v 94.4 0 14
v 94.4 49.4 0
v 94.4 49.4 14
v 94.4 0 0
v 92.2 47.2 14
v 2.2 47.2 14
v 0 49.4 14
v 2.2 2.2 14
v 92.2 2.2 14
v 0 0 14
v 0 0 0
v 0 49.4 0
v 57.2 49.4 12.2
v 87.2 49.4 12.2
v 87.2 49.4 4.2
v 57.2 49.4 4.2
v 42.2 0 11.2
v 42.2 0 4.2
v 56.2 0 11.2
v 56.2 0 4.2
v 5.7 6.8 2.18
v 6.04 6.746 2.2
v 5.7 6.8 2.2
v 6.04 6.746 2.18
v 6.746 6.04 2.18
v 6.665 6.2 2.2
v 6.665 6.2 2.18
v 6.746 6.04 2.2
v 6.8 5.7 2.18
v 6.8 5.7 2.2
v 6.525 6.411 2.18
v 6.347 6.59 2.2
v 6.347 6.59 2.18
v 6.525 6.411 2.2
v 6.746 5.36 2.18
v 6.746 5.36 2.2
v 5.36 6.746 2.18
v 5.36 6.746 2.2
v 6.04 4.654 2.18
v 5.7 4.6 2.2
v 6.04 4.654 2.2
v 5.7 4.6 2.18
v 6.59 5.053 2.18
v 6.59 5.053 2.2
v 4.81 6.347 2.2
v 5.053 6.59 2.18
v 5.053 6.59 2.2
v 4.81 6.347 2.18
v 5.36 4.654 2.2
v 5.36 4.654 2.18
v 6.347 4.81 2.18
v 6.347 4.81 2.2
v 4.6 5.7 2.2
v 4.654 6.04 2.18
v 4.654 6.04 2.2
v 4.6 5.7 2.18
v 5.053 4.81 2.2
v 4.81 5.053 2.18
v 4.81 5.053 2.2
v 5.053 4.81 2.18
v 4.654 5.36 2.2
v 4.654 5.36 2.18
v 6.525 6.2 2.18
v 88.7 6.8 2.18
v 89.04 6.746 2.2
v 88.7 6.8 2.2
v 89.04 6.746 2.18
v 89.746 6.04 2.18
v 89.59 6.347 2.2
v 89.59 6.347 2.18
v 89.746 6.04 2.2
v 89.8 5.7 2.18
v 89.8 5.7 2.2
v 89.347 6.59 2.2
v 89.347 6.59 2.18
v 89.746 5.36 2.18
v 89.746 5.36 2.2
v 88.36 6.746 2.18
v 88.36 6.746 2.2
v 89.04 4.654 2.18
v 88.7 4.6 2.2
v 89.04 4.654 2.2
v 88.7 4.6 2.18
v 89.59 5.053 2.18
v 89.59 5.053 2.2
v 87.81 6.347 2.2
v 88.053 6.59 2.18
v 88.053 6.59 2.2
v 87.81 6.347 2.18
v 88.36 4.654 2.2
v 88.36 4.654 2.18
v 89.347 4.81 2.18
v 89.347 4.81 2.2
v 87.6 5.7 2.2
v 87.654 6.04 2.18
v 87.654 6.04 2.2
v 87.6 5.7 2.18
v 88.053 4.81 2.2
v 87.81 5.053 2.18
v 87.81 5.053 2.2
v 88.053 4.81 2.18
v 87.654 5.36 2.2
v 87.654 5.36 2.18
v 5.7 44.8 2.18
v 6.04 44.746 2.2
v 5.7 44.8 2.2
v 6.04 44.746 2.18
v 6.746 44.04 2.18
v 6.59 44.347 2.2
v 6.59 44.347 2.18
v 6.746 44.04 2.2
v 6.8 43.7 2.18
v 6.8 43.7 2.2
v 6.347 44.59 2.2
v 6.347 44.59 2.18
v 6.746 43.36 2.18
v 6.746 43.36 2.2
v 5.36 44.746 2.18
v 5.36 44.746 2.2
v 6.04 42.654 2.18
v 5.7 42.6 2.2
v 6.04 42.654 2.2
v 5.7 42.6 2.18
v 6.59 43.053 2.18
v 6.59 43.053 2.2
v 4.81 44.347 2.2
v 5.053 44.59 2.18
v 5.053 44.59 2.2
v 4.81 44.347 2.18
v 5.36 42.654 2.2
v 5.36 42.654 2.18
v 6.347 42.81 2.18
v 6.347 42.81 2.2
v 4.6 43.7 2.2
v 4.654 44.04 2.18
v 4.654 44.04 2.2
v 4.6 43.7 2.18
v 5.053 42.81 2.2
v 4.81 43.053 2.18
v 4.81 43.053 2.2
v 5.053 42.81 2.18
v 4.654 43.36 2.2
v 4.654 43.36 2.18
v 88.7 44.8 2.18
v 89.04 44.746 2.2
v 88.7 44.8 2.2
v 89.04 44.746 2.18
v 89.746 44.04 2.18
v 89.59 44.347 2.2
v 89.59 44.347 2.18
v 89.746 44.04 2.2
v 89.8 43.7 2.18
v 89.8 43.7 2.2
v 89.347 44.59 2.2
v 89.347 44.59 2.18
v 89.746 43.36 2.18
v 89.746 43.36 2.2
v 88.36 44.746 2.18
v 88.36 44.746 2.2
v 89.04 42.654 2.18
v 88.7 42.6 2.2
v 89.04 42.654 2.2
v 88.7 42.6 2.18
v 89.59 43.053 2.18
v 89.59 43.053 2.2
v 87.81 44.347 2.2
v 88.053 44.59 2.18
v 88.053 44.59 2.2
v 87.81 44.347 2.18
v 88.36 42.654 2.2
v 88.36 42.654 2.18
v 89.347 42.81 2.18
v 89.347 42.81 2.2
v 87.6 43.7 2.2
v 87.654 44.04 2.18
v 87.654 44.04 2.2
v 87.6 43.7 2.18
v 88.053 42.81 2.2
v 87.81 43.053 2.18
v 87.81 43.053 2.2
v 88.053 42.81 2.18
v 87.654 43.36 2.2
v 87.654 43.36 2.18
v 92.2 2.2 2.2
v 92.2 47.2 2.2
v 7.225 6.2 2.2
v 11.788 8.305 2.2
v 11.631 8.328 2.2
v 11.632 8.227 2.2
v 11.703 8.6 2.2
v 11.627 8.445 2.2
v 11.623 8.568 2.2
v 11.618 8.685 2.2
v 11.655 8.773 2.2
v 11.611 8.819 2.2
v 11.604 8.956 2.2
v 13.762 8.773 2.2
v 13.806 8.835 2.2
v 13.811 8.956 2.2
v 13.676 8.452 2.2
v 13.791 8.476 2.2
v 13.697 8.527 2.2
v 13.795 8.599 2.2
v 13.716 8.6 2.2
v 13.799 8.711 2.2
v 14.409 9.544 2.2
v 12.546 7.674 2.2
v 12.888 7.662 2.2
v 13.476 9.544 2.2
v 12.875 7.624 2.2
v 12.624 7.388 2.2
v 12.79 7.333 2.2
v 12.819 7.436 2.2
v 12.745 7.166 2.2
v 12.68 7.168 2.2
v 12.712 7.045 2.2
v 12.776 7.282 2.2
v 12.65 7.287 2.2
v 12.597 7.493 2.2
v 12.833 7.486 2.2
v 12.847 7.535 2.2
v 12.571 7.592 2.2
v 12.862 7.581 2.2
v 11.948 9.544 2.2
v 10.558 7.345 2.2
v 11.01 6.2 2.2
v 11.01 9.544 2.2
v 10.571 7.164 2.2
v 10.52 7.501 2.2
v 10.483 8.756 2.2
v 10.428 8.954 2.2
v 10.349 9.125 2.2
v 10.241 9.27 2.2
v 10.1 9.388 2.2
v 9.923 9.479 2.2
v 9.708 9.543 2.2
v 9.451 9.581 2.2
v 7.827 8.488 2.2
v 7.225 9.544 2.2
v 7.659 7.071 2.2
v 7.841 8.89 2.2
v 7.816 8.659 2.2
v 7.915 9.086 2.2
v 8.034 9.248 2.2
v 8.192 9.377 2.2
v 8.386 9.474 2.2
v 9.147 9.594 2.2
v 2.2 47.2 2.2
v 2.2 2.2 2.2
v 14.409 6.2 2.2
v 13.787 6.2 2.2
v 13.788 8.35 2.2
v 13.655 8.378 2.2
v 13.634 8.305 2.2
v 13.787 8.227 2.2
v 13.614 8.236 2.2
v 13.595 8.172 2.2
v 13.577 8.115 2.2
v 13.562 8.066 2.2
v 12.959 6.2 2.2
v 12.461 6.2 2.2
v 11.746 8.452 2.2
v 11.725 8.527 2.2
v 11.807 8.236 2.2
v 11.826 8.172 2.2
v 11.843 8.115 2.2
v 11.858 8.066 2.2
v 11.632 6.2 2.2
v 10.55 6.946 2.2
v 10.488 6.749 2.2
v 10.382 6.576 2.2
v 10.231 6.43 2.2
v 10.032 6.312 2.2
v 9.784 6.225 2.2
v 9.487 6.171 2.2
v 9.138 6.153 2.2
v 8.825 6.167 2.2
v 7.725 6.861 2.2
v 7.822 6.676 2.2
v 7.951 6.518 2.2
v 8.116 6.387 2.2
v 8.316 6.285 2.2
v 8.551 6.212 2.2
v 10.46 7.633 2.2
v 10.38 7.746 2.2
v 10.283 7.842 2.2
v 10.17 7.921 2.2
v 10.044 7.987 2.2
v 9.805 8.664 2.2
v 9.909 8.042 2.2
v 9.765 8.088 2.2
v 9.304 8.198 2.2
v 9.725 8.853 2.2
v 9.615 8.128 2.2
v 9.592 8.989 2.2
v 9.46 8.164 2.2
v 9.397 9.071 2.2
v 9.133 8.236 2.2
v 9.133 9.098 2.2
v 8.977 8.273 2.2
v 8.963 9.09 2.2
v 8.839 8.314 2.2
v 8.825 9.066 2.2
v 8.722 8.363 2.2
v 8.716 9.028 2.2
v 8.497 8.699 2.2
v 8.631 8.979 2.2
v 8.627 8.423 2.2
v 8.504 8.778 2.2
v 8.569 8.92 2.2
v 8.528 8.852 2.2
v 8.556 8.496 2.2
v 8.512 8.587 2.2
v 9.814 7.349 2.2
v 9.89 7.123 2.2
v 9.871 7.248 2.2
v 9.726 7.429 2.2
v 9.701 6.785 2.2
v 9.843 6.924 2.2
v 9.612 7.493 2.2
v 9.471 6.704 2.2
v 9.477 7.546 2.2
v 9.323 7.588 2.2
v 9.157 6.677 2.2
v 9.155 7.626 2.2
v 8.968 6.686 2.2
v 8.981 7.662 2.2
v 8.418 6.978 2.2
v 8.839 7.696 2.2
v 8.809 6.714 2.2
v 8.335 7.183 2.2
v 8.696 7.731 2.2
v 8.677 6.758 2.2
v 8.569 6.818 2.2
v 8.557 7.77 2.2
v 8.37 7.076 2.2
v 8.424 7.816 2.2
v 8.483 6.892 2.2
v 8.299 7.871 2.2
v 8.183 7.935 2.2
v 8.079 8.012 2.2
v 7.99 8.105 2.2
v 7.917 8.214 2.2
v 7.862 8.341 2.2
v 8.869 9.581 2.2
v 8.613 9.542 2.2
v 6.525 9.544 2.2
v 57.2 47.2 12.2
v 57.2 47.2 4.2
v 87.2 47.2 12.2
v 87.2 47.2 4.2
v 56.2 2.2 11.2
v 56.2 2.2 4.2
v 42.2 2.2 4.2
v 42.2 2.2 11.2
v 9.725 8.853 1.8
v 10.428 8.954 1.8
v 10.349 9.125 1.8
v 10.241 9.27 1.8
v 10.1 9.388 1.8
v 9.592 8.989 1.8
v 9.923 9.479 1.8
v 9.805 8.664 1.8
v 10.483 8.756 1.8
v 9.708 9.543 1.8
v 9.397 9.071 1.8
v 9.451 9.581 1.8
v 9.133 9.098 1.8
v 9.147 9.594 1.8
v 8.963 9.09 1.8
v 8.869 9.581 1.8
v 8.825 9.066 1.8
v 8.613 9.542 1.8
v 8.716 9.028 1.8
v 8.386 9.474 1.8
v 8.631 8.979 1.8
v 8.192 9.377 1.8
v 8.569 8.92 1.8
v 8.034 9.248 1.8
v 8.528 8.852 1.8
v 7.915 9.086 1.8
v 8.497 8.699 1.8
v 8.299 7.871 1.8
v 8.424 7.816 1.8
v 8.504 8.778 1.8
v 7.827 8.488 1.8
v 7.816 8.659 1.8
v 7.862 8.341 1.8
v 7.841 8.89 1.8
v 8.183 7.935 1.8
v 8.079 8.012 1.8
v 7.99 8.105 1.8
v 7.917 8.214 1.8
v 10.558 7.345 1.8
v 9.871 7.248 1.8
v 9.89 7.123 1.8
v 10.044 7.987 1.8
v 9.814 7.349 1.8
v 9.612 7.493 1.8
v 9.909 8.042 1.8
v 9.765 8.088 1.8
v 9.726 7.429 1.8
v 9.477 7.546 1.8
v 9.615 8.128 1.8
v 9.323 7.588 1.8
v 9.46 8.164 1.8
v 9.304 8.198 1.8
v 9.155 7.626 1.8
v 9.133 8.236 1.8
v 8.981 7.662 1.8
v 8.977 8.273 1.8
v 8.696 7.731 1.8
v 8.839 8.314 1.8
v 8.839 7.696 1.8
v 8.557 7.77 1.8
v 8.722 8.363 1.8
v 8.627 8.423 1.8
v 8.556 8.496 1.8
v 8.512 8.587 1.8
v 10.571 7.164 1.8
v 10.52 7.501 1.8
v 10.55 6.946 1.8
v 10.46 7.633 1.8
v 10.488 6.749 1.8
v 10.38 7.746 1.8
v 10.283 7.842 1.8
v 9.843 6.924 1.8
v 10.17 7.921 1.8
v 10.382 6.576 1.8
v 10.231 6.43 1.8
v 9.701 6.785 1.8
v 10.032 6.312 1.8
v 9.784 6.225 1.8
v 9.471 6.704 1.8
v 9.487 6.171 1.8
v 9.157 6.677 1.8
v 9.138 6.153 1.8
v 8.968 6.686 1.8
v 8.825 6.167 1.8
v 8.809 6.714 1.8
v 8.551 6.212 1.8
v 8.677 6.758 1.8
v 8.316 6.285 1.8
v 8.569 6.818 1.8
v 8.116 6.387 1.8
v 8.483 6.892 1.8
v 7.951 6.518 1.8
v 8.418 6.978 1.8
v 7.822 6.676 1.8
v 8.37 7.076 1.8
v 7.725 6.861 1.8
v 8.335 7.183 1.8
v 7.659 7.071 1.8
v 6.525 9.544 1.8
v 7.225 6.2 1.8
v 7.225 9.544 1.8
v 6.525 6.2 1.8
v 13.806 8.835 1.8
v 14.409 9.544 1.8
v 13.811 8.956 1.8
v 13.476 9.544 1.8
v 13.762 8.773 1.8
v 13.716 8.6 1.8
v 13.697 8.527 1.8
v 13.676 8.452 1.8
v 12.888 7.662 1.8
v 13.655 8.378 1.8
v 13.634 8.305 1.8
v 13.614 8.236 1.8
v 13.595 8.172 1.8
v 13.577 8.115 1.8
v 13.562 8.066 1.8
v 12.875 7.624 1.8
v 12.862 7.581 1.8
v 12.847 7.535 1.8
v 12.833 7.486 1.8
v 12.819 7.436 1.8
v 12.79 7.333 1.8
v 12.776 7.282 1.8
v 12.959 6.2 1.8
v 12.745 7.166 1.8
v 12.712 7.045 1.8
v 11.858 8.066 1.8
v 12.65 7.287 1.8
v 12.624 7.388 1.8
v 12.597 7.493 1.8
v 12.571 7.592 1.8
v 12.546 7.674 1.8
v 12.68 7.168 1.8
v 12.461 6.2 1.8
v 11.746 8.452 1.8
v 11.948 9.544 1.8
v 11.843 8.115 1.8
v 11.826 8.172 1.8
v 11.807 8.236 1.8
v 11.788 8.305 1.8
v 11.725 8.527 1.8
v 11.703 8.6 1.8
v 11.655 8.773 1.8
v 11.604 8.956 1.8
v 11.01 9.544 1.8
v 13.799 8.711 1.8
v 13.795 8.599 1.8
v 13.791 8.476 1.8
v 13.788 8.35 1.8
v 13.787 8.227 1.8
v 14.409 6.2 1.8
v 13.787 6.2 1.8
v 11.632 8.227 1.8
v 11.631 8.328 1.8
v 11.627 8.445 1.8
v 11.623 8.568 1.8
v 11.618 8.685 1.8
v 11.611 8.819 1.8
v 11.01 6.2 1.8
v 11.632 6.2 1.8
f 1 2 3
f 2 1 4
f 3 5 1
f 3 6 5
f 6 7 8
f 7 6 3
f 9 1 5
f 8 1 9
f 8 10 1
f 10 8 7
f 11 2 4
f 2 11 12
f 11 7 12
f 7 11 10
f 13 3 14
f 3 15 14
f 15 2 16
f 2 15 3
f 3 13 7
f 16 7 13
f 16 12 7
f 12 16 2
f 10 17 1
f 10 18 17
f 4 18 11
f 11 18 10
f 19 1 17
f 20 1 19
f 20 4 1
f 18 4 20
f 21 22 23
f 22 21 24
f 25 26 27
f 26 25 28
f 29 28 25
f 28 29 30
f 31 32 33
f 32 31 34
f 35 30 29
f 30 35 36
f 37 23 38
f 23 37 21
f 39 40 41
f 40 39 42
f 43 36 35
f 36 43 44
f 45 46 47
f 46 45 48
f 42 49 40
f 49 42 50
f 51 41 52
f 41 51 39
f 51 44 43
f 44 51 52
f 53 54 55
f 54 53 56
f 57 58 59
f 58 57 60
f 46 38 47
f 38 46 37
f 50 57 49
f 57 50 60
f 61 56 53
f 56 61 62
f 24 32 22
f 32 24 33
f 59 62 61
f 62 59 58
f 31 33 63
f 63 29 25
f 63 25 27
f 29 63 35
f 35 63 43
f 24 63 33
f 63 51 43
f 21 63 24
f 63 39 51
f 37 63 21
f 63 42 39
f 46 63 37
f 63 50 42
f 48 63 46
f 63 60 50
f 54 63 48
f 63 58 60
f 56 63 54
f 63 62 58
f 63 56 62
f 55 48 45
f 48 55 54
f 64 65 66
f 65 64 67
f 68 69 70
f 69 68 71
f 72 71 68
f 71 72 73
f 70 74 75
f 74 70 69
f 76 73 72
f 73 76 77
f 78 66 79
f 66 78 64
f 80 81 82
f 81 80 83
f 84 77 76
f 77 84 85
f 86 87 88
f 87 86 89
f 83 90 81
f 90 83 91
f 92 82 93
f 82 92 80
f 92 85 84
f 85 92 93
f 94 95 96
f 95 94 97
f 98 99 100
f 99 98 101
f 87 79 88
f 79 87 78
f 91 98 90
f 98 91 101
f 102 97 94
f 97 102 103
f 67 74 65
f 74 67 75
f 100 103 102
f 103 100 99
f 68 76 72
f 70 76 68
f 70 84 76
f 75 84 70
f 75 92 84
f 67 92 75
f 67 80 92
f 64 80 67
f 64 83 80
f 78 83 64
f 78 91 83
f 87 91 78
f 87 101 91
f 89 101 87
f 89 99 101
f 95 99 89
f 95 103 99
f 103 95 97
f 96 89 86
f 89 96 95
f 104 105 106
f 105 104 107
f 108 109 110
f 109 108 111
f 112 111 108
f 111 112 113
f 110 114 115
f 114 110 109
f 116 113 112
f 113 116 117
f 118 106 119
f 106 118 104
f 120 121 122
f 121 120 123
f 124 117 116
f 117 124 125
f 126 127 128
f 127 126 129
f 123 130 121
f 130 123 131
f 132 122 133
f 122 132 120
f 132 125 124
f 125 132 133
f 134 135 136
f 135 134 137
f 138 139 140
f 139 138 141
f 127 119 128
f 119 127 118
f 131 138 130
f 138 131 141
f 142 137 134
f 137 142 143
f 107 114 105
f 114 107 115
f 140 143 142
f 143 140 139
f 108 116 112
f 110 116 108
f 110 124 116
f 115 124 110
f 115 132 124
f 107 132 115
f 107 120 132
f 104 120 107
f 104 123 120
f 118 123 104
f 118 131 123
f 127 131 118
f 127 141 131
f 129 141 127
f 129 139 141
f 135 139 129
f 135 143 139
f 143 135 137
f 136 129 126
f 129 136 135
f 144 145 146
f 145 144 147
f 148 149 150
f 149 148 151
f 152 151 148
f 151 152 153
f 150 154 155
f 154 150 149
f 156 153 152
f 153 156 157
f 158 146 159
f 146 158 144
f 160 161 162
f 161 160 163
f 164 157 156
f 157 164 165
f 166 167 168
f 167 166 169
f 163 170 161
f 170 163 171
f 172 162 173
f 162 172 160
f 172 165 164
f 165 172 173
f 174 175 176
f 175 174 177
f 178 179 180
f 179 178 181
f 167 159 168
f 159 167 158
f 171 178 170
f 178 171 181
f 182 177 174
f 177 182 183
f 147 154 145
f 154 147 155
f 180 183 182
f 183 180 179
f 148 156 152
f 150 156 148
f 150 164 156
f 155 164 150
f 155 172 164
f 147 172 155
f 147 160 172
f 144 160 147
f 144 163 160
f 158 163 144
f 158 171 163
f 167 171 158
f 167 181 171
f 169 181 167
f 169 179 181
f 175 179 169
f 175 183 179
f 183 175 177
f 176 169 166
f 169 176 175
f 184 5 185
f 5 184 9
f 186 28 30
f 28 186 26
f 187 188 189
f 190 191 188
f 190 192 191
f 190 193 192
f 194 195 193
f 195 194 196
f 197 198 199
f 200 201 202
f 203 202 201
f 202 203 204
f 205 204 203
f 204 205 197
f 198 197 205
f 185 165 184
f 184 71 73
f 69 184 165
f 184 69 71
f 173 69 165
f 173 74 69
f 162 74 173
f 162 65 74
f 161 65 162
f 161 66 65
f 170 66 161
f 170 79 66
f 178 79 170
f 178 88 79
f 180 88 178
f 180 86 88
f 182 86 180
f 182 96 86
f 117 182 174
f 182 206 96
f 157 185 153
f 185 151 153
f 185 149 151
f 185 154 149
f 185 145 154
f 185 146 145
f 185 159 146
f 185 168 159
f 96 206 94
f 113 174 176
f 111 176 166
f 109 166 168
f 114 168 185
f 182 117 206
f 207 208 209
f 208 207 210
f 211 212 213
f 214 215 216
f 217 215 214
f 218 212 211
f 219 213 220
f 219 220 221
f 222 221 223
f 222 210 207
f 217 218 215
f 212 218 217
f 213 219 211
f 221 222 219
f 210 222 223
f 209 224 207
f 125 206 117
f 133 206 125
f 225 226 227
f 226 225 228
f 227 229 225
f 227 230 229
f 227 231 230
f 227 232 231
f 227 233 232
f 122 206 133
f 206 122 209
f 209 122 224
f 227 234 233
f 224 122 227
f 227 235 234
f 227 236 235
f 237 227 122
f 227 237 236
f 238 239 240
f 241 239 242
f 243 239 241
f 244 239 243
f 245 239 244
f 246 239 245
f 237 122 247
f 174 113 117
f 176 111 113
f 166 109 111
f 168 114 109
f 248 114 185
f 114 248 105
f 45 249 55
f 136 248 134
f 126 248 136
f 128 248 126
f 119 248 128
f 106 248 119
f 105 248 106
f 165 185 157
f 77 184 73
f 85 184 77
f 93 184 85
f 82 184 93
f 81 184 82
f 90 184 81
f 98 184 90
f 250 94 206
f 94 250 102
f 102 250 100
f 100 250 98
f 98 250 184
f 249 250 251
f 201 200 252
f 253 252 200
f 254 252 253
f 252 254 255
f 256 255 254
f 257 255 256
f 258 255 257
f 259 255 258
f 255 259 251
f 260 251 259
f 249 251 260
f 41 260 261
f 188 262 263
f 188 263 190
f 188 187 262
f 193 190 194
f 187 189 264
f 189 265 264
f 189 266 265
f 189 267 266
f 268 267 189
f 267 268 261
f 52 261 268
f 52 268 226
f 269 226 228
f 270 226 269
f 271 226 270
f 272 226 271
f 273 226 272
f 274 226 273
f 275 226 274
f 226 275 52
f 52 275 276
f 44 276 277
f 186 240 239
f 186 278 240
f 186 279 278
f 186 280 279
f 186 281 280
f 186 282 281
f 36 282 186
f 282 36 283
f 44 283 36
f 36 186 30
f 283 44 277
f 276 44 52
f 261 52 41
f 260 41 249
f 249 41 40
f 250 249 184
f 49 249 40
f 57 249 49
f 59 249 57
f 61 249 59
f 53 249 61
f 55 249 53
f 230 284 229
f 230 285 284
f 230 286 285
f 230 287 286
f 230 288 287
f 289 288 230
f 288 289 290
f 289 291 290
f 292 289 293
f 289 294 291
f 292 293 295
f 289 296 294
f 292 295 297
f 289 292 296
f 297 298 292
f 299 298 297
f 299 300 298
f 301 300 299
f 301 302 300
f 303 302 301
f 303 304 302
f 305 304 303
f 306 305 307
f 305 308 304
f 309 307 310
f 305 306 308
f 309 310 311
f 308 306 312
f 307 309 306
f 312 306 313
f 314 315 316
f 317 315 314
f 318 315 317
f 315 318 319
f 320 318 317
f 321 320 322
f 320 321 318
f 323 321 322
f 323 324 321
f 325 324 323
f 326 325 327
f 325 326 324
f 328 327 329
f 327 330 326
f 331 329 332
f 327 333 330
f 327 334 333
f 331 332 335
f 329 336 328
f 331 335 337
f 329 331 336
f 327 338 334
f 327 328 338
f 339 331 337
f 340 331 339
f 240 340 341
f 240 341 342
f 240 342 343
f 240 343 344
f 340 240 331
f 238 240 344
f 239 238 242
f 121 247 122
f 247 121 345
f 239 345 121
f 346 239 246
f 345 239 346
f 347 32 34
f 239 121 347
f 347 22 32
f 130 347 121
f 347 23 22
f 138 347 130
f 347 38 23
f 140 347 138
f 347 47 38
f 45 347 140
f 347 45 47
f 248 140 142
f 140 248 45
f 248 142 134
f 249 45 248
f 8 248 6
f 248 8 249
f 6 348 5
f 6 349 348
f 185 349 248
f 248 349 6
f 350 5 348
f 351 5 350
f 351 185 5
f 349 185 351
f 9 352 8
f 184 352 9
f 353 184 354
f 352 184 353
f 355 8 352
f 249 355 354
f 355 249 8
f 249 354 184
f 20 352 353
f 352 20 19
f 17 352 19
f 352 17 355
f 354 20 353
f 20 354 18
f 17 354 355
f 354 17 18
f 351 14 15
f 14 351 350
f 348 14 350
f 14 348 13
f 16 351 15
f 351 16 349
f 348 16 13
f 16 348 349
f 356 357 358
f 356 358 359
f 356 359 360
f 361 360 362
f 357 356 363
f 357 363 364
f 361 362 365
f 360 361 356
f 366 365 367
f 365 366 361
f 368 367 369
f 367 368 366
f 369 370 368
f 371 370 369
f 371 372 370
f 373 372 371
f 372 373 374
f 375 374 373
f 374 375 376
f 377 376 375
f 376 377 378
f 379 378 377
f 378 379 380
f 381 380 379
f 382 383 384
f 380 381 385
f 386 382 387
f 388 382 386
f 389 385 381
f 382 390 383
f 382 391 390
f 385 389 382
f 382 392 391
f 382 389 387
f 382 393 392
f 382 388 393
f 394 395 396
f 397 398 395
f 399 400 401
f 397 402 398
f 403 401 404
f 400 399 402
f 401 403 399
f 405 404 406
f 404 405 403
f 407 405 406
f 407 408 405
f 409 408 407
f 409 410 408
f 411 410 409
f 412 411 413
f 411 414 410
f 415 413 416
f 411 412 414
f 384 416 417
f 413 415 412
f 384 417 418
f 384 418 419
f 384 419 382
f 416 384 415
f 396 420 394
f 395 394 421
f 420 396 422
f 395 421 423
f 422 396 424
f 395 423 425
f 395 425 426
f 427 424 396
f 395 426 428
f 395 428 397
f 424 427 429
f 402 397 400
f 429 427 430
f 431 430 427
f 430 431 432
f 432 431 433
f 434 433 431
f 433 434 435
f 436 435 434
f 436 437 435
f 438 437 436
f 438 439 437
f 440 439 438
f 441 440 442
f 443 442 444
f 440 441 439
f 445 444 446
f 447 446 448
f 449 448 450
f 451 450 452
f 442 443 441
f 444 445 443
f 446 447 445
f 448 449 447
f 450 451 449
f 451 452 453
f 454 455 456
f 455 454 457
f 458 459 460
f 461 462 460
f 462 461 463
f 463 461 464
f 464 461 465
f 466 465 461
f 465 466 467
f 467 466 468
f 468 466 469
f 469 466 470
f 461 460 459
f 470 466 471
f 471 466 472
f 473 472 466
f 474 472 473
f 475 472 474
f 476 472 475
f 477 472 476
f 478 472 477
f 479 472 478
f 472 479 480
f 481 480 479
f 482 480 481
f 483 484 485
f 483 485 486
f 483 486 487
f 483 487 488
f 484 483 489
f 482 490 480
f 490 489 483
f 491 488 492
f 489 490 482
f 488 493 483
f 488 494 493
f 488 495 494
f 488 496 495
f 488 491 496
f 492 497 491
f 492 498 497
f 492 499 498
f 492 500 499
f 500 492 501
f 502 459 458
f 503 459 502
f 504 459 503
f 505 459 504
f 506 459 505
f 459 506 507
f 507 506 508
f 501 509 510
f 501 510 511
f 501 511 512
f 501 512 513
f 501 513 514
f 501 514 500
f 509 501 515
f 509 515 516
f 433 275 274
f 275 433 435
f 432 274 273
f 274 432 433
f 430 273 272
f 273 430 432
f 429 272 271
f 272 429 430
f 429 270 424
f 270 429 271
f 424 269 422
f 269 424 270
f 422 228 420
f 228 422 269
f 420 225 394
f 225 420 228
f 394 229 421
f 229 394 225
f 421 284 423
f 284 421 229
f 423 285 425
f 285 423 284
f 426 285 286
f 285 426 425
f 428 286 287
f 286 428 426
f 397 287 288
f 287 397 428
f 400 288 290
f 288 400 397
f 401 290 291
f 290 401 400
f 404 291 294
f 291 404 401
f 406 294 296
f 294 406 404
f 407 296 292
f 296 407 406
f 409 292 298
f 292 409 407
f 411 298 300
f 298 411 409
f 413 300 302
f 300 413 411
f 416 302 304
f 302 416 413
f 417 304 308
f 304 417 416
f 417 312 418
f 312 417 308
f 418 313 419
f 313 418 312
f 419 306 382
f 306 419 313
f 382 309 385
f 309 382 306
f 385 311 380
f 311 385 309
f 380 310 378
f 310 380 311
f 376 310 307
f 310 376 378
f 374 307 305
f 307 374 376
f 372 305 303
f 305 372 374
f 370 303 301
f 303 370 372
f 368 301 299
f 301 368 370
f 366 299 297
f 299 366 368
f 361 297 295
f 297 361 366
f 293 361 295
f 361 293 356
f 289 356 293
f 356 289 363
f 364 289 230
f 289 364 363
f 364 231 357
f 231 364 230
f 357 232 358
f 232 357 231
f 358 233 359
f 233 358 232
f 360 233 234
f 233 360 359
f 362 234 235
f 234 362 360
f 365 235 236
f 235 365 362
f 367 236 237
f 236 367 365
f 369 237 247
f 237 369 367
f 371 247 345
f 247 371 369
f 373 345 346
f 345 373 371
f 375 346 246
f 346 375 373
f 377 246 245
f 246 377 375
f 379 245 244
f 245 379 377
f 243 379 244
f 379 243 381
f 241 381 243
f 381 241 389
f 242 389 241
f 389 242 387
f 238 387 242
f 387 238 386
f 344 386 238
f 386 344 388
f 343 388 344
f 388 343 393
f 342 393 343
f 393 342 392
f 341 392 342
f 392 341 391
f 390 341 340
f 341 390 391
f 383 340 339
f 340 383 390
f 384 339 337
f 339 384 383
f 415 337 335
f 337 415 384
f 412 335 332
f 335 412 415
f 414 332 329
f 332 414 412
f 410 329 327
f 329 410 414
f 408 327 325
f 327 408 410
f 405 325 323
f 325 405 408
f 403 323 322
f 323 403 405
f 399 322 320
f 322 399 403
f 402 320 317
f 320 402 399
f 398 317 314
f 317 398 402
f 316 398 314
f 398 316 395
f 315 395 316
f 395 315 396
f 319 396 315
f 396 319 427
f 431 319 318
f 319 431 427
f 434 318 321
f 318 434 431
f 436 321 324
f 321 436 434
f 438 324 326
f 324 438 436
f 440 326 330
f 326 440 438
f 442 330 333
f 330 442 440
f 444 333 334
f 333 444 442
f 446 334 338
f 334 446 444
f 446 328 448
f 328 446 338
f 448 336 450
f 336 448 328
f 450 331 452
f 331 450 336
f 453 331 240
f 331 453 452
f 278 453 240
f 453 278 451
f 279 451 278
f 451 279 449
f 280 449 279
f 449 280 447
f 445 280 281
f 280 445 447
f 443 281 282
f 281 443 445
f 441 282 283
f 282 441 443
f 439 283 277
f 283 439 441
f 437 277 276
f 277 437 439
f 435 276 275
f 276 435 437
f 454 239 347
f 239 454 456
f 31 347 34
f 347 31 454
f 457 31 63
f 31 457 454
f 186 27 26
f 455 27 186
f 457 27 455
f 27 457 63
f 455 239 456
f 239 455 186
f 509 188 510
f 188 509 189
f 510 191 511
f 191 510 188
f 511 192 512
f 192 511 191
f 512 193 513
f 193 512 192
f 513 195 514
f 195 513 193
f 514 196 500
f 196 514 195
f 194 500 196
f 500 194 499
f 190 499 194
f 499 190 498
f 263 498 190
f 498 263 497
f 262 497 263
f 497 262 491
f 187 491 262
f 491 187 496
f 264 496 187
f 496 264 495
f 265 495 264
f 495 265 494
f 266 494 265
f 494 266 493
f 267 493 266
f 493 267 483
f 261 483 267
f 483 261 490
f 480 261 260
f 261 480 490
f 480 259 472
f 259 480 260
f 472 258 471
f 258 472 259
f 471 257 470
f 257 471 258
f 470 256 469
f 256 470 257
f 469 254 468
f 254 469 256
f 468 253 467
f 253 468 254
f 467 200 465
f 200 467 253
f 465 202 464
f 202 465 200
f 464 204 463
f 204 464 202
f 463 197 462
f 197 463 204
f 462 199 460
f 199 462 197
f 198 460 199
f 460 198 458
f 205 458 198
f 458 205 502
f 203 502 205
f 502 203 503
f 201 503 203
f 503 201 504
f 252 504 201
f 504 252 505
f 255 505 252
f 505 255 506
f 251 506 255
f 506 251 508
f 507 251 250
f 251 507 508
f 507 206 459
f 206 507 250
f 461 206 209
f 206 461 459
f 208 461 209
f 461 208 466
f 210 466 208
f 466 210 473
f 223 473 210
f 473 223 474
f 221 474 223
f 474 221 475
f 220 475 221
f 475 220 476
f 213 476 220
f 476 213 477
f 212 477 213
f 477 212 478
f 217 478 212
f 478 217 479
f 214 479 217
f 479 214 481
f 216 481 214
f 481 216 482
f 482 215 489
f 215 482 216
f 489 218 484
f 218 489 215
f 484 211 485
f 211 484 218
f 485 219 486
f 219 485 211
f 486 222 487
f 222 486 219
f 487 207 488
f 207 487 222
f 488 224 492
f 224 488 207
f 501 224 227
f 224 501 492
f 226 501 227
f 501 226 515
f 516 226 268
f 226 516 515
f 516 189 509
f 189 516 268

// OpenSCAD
// ISM IDE / PATA carrier shell (original ISM) — 2.5" bay style
pcb_w = 90;
pcb_d = 45;
wall = 2.2;
box_h = 14;
eps = 0.02;
mount_d = 2.2;
badge_depth = 0.4;

mounts = [[3.5, 3.5], [pcb_w - 3.5, 3.5], [3.5, pcb_d - 3.5], [pcb_w - 3.5, pcb_d - 3.5]];

module carrier() {
  difference() {
    union() {
      cube([pcb_w + 2 * wall, pcb_d + 2 * wall, box_h]);
      for (p = mounts)
        translate([p[0] + wall, p[1] + wall, wall - eps])
          cylinder(h = 4 + eps, d = 5, $fn = 24);
    }
    translate([wall, wall, wall])
      cube([pcb_w, pcb_d, box_h - wall + eps]);
    // USB-C
    translate([wall + 40, -eps, wall + 2])
      cube([14, wall + 4, 7]);
    // IDE ribbon / drive bay opening
    translate([wall + 55, wall + pcb_d - 1, wall + 2])
      cube([30, wall + 3, 8]);
    // Drive power header
    translate([wall + 72, wall + pcb_d - 1, wall + 4])
      cube([12, wall + 3, 6]);
    for (p = mounts)
      translate([p[0] + wall, p[1] + wall, wall - eps])
        cylinder(h = 8 + 2 * eps, d = mount_d, $fn = 20);
    translate([wall + 4, wall + 4, wall - badge_depth])
      linear_extrude(height = badge_depth + eps)
        text("ISM", size = 3.5, font = "Liberation Sans:style=Bold");
  }
}

module lid() {
  difference() {
    cube([pcb_w + 2 * wall, pcb_d + 2 * wall, 2.5]);
    translate([4, 4, 2.5 - badge_depth])
      linear_extrude(height = badge_depth + eps)
        text("IDE", size = 4, font = "Liberation Sans:style=Bold");
  }
}

carrier();
